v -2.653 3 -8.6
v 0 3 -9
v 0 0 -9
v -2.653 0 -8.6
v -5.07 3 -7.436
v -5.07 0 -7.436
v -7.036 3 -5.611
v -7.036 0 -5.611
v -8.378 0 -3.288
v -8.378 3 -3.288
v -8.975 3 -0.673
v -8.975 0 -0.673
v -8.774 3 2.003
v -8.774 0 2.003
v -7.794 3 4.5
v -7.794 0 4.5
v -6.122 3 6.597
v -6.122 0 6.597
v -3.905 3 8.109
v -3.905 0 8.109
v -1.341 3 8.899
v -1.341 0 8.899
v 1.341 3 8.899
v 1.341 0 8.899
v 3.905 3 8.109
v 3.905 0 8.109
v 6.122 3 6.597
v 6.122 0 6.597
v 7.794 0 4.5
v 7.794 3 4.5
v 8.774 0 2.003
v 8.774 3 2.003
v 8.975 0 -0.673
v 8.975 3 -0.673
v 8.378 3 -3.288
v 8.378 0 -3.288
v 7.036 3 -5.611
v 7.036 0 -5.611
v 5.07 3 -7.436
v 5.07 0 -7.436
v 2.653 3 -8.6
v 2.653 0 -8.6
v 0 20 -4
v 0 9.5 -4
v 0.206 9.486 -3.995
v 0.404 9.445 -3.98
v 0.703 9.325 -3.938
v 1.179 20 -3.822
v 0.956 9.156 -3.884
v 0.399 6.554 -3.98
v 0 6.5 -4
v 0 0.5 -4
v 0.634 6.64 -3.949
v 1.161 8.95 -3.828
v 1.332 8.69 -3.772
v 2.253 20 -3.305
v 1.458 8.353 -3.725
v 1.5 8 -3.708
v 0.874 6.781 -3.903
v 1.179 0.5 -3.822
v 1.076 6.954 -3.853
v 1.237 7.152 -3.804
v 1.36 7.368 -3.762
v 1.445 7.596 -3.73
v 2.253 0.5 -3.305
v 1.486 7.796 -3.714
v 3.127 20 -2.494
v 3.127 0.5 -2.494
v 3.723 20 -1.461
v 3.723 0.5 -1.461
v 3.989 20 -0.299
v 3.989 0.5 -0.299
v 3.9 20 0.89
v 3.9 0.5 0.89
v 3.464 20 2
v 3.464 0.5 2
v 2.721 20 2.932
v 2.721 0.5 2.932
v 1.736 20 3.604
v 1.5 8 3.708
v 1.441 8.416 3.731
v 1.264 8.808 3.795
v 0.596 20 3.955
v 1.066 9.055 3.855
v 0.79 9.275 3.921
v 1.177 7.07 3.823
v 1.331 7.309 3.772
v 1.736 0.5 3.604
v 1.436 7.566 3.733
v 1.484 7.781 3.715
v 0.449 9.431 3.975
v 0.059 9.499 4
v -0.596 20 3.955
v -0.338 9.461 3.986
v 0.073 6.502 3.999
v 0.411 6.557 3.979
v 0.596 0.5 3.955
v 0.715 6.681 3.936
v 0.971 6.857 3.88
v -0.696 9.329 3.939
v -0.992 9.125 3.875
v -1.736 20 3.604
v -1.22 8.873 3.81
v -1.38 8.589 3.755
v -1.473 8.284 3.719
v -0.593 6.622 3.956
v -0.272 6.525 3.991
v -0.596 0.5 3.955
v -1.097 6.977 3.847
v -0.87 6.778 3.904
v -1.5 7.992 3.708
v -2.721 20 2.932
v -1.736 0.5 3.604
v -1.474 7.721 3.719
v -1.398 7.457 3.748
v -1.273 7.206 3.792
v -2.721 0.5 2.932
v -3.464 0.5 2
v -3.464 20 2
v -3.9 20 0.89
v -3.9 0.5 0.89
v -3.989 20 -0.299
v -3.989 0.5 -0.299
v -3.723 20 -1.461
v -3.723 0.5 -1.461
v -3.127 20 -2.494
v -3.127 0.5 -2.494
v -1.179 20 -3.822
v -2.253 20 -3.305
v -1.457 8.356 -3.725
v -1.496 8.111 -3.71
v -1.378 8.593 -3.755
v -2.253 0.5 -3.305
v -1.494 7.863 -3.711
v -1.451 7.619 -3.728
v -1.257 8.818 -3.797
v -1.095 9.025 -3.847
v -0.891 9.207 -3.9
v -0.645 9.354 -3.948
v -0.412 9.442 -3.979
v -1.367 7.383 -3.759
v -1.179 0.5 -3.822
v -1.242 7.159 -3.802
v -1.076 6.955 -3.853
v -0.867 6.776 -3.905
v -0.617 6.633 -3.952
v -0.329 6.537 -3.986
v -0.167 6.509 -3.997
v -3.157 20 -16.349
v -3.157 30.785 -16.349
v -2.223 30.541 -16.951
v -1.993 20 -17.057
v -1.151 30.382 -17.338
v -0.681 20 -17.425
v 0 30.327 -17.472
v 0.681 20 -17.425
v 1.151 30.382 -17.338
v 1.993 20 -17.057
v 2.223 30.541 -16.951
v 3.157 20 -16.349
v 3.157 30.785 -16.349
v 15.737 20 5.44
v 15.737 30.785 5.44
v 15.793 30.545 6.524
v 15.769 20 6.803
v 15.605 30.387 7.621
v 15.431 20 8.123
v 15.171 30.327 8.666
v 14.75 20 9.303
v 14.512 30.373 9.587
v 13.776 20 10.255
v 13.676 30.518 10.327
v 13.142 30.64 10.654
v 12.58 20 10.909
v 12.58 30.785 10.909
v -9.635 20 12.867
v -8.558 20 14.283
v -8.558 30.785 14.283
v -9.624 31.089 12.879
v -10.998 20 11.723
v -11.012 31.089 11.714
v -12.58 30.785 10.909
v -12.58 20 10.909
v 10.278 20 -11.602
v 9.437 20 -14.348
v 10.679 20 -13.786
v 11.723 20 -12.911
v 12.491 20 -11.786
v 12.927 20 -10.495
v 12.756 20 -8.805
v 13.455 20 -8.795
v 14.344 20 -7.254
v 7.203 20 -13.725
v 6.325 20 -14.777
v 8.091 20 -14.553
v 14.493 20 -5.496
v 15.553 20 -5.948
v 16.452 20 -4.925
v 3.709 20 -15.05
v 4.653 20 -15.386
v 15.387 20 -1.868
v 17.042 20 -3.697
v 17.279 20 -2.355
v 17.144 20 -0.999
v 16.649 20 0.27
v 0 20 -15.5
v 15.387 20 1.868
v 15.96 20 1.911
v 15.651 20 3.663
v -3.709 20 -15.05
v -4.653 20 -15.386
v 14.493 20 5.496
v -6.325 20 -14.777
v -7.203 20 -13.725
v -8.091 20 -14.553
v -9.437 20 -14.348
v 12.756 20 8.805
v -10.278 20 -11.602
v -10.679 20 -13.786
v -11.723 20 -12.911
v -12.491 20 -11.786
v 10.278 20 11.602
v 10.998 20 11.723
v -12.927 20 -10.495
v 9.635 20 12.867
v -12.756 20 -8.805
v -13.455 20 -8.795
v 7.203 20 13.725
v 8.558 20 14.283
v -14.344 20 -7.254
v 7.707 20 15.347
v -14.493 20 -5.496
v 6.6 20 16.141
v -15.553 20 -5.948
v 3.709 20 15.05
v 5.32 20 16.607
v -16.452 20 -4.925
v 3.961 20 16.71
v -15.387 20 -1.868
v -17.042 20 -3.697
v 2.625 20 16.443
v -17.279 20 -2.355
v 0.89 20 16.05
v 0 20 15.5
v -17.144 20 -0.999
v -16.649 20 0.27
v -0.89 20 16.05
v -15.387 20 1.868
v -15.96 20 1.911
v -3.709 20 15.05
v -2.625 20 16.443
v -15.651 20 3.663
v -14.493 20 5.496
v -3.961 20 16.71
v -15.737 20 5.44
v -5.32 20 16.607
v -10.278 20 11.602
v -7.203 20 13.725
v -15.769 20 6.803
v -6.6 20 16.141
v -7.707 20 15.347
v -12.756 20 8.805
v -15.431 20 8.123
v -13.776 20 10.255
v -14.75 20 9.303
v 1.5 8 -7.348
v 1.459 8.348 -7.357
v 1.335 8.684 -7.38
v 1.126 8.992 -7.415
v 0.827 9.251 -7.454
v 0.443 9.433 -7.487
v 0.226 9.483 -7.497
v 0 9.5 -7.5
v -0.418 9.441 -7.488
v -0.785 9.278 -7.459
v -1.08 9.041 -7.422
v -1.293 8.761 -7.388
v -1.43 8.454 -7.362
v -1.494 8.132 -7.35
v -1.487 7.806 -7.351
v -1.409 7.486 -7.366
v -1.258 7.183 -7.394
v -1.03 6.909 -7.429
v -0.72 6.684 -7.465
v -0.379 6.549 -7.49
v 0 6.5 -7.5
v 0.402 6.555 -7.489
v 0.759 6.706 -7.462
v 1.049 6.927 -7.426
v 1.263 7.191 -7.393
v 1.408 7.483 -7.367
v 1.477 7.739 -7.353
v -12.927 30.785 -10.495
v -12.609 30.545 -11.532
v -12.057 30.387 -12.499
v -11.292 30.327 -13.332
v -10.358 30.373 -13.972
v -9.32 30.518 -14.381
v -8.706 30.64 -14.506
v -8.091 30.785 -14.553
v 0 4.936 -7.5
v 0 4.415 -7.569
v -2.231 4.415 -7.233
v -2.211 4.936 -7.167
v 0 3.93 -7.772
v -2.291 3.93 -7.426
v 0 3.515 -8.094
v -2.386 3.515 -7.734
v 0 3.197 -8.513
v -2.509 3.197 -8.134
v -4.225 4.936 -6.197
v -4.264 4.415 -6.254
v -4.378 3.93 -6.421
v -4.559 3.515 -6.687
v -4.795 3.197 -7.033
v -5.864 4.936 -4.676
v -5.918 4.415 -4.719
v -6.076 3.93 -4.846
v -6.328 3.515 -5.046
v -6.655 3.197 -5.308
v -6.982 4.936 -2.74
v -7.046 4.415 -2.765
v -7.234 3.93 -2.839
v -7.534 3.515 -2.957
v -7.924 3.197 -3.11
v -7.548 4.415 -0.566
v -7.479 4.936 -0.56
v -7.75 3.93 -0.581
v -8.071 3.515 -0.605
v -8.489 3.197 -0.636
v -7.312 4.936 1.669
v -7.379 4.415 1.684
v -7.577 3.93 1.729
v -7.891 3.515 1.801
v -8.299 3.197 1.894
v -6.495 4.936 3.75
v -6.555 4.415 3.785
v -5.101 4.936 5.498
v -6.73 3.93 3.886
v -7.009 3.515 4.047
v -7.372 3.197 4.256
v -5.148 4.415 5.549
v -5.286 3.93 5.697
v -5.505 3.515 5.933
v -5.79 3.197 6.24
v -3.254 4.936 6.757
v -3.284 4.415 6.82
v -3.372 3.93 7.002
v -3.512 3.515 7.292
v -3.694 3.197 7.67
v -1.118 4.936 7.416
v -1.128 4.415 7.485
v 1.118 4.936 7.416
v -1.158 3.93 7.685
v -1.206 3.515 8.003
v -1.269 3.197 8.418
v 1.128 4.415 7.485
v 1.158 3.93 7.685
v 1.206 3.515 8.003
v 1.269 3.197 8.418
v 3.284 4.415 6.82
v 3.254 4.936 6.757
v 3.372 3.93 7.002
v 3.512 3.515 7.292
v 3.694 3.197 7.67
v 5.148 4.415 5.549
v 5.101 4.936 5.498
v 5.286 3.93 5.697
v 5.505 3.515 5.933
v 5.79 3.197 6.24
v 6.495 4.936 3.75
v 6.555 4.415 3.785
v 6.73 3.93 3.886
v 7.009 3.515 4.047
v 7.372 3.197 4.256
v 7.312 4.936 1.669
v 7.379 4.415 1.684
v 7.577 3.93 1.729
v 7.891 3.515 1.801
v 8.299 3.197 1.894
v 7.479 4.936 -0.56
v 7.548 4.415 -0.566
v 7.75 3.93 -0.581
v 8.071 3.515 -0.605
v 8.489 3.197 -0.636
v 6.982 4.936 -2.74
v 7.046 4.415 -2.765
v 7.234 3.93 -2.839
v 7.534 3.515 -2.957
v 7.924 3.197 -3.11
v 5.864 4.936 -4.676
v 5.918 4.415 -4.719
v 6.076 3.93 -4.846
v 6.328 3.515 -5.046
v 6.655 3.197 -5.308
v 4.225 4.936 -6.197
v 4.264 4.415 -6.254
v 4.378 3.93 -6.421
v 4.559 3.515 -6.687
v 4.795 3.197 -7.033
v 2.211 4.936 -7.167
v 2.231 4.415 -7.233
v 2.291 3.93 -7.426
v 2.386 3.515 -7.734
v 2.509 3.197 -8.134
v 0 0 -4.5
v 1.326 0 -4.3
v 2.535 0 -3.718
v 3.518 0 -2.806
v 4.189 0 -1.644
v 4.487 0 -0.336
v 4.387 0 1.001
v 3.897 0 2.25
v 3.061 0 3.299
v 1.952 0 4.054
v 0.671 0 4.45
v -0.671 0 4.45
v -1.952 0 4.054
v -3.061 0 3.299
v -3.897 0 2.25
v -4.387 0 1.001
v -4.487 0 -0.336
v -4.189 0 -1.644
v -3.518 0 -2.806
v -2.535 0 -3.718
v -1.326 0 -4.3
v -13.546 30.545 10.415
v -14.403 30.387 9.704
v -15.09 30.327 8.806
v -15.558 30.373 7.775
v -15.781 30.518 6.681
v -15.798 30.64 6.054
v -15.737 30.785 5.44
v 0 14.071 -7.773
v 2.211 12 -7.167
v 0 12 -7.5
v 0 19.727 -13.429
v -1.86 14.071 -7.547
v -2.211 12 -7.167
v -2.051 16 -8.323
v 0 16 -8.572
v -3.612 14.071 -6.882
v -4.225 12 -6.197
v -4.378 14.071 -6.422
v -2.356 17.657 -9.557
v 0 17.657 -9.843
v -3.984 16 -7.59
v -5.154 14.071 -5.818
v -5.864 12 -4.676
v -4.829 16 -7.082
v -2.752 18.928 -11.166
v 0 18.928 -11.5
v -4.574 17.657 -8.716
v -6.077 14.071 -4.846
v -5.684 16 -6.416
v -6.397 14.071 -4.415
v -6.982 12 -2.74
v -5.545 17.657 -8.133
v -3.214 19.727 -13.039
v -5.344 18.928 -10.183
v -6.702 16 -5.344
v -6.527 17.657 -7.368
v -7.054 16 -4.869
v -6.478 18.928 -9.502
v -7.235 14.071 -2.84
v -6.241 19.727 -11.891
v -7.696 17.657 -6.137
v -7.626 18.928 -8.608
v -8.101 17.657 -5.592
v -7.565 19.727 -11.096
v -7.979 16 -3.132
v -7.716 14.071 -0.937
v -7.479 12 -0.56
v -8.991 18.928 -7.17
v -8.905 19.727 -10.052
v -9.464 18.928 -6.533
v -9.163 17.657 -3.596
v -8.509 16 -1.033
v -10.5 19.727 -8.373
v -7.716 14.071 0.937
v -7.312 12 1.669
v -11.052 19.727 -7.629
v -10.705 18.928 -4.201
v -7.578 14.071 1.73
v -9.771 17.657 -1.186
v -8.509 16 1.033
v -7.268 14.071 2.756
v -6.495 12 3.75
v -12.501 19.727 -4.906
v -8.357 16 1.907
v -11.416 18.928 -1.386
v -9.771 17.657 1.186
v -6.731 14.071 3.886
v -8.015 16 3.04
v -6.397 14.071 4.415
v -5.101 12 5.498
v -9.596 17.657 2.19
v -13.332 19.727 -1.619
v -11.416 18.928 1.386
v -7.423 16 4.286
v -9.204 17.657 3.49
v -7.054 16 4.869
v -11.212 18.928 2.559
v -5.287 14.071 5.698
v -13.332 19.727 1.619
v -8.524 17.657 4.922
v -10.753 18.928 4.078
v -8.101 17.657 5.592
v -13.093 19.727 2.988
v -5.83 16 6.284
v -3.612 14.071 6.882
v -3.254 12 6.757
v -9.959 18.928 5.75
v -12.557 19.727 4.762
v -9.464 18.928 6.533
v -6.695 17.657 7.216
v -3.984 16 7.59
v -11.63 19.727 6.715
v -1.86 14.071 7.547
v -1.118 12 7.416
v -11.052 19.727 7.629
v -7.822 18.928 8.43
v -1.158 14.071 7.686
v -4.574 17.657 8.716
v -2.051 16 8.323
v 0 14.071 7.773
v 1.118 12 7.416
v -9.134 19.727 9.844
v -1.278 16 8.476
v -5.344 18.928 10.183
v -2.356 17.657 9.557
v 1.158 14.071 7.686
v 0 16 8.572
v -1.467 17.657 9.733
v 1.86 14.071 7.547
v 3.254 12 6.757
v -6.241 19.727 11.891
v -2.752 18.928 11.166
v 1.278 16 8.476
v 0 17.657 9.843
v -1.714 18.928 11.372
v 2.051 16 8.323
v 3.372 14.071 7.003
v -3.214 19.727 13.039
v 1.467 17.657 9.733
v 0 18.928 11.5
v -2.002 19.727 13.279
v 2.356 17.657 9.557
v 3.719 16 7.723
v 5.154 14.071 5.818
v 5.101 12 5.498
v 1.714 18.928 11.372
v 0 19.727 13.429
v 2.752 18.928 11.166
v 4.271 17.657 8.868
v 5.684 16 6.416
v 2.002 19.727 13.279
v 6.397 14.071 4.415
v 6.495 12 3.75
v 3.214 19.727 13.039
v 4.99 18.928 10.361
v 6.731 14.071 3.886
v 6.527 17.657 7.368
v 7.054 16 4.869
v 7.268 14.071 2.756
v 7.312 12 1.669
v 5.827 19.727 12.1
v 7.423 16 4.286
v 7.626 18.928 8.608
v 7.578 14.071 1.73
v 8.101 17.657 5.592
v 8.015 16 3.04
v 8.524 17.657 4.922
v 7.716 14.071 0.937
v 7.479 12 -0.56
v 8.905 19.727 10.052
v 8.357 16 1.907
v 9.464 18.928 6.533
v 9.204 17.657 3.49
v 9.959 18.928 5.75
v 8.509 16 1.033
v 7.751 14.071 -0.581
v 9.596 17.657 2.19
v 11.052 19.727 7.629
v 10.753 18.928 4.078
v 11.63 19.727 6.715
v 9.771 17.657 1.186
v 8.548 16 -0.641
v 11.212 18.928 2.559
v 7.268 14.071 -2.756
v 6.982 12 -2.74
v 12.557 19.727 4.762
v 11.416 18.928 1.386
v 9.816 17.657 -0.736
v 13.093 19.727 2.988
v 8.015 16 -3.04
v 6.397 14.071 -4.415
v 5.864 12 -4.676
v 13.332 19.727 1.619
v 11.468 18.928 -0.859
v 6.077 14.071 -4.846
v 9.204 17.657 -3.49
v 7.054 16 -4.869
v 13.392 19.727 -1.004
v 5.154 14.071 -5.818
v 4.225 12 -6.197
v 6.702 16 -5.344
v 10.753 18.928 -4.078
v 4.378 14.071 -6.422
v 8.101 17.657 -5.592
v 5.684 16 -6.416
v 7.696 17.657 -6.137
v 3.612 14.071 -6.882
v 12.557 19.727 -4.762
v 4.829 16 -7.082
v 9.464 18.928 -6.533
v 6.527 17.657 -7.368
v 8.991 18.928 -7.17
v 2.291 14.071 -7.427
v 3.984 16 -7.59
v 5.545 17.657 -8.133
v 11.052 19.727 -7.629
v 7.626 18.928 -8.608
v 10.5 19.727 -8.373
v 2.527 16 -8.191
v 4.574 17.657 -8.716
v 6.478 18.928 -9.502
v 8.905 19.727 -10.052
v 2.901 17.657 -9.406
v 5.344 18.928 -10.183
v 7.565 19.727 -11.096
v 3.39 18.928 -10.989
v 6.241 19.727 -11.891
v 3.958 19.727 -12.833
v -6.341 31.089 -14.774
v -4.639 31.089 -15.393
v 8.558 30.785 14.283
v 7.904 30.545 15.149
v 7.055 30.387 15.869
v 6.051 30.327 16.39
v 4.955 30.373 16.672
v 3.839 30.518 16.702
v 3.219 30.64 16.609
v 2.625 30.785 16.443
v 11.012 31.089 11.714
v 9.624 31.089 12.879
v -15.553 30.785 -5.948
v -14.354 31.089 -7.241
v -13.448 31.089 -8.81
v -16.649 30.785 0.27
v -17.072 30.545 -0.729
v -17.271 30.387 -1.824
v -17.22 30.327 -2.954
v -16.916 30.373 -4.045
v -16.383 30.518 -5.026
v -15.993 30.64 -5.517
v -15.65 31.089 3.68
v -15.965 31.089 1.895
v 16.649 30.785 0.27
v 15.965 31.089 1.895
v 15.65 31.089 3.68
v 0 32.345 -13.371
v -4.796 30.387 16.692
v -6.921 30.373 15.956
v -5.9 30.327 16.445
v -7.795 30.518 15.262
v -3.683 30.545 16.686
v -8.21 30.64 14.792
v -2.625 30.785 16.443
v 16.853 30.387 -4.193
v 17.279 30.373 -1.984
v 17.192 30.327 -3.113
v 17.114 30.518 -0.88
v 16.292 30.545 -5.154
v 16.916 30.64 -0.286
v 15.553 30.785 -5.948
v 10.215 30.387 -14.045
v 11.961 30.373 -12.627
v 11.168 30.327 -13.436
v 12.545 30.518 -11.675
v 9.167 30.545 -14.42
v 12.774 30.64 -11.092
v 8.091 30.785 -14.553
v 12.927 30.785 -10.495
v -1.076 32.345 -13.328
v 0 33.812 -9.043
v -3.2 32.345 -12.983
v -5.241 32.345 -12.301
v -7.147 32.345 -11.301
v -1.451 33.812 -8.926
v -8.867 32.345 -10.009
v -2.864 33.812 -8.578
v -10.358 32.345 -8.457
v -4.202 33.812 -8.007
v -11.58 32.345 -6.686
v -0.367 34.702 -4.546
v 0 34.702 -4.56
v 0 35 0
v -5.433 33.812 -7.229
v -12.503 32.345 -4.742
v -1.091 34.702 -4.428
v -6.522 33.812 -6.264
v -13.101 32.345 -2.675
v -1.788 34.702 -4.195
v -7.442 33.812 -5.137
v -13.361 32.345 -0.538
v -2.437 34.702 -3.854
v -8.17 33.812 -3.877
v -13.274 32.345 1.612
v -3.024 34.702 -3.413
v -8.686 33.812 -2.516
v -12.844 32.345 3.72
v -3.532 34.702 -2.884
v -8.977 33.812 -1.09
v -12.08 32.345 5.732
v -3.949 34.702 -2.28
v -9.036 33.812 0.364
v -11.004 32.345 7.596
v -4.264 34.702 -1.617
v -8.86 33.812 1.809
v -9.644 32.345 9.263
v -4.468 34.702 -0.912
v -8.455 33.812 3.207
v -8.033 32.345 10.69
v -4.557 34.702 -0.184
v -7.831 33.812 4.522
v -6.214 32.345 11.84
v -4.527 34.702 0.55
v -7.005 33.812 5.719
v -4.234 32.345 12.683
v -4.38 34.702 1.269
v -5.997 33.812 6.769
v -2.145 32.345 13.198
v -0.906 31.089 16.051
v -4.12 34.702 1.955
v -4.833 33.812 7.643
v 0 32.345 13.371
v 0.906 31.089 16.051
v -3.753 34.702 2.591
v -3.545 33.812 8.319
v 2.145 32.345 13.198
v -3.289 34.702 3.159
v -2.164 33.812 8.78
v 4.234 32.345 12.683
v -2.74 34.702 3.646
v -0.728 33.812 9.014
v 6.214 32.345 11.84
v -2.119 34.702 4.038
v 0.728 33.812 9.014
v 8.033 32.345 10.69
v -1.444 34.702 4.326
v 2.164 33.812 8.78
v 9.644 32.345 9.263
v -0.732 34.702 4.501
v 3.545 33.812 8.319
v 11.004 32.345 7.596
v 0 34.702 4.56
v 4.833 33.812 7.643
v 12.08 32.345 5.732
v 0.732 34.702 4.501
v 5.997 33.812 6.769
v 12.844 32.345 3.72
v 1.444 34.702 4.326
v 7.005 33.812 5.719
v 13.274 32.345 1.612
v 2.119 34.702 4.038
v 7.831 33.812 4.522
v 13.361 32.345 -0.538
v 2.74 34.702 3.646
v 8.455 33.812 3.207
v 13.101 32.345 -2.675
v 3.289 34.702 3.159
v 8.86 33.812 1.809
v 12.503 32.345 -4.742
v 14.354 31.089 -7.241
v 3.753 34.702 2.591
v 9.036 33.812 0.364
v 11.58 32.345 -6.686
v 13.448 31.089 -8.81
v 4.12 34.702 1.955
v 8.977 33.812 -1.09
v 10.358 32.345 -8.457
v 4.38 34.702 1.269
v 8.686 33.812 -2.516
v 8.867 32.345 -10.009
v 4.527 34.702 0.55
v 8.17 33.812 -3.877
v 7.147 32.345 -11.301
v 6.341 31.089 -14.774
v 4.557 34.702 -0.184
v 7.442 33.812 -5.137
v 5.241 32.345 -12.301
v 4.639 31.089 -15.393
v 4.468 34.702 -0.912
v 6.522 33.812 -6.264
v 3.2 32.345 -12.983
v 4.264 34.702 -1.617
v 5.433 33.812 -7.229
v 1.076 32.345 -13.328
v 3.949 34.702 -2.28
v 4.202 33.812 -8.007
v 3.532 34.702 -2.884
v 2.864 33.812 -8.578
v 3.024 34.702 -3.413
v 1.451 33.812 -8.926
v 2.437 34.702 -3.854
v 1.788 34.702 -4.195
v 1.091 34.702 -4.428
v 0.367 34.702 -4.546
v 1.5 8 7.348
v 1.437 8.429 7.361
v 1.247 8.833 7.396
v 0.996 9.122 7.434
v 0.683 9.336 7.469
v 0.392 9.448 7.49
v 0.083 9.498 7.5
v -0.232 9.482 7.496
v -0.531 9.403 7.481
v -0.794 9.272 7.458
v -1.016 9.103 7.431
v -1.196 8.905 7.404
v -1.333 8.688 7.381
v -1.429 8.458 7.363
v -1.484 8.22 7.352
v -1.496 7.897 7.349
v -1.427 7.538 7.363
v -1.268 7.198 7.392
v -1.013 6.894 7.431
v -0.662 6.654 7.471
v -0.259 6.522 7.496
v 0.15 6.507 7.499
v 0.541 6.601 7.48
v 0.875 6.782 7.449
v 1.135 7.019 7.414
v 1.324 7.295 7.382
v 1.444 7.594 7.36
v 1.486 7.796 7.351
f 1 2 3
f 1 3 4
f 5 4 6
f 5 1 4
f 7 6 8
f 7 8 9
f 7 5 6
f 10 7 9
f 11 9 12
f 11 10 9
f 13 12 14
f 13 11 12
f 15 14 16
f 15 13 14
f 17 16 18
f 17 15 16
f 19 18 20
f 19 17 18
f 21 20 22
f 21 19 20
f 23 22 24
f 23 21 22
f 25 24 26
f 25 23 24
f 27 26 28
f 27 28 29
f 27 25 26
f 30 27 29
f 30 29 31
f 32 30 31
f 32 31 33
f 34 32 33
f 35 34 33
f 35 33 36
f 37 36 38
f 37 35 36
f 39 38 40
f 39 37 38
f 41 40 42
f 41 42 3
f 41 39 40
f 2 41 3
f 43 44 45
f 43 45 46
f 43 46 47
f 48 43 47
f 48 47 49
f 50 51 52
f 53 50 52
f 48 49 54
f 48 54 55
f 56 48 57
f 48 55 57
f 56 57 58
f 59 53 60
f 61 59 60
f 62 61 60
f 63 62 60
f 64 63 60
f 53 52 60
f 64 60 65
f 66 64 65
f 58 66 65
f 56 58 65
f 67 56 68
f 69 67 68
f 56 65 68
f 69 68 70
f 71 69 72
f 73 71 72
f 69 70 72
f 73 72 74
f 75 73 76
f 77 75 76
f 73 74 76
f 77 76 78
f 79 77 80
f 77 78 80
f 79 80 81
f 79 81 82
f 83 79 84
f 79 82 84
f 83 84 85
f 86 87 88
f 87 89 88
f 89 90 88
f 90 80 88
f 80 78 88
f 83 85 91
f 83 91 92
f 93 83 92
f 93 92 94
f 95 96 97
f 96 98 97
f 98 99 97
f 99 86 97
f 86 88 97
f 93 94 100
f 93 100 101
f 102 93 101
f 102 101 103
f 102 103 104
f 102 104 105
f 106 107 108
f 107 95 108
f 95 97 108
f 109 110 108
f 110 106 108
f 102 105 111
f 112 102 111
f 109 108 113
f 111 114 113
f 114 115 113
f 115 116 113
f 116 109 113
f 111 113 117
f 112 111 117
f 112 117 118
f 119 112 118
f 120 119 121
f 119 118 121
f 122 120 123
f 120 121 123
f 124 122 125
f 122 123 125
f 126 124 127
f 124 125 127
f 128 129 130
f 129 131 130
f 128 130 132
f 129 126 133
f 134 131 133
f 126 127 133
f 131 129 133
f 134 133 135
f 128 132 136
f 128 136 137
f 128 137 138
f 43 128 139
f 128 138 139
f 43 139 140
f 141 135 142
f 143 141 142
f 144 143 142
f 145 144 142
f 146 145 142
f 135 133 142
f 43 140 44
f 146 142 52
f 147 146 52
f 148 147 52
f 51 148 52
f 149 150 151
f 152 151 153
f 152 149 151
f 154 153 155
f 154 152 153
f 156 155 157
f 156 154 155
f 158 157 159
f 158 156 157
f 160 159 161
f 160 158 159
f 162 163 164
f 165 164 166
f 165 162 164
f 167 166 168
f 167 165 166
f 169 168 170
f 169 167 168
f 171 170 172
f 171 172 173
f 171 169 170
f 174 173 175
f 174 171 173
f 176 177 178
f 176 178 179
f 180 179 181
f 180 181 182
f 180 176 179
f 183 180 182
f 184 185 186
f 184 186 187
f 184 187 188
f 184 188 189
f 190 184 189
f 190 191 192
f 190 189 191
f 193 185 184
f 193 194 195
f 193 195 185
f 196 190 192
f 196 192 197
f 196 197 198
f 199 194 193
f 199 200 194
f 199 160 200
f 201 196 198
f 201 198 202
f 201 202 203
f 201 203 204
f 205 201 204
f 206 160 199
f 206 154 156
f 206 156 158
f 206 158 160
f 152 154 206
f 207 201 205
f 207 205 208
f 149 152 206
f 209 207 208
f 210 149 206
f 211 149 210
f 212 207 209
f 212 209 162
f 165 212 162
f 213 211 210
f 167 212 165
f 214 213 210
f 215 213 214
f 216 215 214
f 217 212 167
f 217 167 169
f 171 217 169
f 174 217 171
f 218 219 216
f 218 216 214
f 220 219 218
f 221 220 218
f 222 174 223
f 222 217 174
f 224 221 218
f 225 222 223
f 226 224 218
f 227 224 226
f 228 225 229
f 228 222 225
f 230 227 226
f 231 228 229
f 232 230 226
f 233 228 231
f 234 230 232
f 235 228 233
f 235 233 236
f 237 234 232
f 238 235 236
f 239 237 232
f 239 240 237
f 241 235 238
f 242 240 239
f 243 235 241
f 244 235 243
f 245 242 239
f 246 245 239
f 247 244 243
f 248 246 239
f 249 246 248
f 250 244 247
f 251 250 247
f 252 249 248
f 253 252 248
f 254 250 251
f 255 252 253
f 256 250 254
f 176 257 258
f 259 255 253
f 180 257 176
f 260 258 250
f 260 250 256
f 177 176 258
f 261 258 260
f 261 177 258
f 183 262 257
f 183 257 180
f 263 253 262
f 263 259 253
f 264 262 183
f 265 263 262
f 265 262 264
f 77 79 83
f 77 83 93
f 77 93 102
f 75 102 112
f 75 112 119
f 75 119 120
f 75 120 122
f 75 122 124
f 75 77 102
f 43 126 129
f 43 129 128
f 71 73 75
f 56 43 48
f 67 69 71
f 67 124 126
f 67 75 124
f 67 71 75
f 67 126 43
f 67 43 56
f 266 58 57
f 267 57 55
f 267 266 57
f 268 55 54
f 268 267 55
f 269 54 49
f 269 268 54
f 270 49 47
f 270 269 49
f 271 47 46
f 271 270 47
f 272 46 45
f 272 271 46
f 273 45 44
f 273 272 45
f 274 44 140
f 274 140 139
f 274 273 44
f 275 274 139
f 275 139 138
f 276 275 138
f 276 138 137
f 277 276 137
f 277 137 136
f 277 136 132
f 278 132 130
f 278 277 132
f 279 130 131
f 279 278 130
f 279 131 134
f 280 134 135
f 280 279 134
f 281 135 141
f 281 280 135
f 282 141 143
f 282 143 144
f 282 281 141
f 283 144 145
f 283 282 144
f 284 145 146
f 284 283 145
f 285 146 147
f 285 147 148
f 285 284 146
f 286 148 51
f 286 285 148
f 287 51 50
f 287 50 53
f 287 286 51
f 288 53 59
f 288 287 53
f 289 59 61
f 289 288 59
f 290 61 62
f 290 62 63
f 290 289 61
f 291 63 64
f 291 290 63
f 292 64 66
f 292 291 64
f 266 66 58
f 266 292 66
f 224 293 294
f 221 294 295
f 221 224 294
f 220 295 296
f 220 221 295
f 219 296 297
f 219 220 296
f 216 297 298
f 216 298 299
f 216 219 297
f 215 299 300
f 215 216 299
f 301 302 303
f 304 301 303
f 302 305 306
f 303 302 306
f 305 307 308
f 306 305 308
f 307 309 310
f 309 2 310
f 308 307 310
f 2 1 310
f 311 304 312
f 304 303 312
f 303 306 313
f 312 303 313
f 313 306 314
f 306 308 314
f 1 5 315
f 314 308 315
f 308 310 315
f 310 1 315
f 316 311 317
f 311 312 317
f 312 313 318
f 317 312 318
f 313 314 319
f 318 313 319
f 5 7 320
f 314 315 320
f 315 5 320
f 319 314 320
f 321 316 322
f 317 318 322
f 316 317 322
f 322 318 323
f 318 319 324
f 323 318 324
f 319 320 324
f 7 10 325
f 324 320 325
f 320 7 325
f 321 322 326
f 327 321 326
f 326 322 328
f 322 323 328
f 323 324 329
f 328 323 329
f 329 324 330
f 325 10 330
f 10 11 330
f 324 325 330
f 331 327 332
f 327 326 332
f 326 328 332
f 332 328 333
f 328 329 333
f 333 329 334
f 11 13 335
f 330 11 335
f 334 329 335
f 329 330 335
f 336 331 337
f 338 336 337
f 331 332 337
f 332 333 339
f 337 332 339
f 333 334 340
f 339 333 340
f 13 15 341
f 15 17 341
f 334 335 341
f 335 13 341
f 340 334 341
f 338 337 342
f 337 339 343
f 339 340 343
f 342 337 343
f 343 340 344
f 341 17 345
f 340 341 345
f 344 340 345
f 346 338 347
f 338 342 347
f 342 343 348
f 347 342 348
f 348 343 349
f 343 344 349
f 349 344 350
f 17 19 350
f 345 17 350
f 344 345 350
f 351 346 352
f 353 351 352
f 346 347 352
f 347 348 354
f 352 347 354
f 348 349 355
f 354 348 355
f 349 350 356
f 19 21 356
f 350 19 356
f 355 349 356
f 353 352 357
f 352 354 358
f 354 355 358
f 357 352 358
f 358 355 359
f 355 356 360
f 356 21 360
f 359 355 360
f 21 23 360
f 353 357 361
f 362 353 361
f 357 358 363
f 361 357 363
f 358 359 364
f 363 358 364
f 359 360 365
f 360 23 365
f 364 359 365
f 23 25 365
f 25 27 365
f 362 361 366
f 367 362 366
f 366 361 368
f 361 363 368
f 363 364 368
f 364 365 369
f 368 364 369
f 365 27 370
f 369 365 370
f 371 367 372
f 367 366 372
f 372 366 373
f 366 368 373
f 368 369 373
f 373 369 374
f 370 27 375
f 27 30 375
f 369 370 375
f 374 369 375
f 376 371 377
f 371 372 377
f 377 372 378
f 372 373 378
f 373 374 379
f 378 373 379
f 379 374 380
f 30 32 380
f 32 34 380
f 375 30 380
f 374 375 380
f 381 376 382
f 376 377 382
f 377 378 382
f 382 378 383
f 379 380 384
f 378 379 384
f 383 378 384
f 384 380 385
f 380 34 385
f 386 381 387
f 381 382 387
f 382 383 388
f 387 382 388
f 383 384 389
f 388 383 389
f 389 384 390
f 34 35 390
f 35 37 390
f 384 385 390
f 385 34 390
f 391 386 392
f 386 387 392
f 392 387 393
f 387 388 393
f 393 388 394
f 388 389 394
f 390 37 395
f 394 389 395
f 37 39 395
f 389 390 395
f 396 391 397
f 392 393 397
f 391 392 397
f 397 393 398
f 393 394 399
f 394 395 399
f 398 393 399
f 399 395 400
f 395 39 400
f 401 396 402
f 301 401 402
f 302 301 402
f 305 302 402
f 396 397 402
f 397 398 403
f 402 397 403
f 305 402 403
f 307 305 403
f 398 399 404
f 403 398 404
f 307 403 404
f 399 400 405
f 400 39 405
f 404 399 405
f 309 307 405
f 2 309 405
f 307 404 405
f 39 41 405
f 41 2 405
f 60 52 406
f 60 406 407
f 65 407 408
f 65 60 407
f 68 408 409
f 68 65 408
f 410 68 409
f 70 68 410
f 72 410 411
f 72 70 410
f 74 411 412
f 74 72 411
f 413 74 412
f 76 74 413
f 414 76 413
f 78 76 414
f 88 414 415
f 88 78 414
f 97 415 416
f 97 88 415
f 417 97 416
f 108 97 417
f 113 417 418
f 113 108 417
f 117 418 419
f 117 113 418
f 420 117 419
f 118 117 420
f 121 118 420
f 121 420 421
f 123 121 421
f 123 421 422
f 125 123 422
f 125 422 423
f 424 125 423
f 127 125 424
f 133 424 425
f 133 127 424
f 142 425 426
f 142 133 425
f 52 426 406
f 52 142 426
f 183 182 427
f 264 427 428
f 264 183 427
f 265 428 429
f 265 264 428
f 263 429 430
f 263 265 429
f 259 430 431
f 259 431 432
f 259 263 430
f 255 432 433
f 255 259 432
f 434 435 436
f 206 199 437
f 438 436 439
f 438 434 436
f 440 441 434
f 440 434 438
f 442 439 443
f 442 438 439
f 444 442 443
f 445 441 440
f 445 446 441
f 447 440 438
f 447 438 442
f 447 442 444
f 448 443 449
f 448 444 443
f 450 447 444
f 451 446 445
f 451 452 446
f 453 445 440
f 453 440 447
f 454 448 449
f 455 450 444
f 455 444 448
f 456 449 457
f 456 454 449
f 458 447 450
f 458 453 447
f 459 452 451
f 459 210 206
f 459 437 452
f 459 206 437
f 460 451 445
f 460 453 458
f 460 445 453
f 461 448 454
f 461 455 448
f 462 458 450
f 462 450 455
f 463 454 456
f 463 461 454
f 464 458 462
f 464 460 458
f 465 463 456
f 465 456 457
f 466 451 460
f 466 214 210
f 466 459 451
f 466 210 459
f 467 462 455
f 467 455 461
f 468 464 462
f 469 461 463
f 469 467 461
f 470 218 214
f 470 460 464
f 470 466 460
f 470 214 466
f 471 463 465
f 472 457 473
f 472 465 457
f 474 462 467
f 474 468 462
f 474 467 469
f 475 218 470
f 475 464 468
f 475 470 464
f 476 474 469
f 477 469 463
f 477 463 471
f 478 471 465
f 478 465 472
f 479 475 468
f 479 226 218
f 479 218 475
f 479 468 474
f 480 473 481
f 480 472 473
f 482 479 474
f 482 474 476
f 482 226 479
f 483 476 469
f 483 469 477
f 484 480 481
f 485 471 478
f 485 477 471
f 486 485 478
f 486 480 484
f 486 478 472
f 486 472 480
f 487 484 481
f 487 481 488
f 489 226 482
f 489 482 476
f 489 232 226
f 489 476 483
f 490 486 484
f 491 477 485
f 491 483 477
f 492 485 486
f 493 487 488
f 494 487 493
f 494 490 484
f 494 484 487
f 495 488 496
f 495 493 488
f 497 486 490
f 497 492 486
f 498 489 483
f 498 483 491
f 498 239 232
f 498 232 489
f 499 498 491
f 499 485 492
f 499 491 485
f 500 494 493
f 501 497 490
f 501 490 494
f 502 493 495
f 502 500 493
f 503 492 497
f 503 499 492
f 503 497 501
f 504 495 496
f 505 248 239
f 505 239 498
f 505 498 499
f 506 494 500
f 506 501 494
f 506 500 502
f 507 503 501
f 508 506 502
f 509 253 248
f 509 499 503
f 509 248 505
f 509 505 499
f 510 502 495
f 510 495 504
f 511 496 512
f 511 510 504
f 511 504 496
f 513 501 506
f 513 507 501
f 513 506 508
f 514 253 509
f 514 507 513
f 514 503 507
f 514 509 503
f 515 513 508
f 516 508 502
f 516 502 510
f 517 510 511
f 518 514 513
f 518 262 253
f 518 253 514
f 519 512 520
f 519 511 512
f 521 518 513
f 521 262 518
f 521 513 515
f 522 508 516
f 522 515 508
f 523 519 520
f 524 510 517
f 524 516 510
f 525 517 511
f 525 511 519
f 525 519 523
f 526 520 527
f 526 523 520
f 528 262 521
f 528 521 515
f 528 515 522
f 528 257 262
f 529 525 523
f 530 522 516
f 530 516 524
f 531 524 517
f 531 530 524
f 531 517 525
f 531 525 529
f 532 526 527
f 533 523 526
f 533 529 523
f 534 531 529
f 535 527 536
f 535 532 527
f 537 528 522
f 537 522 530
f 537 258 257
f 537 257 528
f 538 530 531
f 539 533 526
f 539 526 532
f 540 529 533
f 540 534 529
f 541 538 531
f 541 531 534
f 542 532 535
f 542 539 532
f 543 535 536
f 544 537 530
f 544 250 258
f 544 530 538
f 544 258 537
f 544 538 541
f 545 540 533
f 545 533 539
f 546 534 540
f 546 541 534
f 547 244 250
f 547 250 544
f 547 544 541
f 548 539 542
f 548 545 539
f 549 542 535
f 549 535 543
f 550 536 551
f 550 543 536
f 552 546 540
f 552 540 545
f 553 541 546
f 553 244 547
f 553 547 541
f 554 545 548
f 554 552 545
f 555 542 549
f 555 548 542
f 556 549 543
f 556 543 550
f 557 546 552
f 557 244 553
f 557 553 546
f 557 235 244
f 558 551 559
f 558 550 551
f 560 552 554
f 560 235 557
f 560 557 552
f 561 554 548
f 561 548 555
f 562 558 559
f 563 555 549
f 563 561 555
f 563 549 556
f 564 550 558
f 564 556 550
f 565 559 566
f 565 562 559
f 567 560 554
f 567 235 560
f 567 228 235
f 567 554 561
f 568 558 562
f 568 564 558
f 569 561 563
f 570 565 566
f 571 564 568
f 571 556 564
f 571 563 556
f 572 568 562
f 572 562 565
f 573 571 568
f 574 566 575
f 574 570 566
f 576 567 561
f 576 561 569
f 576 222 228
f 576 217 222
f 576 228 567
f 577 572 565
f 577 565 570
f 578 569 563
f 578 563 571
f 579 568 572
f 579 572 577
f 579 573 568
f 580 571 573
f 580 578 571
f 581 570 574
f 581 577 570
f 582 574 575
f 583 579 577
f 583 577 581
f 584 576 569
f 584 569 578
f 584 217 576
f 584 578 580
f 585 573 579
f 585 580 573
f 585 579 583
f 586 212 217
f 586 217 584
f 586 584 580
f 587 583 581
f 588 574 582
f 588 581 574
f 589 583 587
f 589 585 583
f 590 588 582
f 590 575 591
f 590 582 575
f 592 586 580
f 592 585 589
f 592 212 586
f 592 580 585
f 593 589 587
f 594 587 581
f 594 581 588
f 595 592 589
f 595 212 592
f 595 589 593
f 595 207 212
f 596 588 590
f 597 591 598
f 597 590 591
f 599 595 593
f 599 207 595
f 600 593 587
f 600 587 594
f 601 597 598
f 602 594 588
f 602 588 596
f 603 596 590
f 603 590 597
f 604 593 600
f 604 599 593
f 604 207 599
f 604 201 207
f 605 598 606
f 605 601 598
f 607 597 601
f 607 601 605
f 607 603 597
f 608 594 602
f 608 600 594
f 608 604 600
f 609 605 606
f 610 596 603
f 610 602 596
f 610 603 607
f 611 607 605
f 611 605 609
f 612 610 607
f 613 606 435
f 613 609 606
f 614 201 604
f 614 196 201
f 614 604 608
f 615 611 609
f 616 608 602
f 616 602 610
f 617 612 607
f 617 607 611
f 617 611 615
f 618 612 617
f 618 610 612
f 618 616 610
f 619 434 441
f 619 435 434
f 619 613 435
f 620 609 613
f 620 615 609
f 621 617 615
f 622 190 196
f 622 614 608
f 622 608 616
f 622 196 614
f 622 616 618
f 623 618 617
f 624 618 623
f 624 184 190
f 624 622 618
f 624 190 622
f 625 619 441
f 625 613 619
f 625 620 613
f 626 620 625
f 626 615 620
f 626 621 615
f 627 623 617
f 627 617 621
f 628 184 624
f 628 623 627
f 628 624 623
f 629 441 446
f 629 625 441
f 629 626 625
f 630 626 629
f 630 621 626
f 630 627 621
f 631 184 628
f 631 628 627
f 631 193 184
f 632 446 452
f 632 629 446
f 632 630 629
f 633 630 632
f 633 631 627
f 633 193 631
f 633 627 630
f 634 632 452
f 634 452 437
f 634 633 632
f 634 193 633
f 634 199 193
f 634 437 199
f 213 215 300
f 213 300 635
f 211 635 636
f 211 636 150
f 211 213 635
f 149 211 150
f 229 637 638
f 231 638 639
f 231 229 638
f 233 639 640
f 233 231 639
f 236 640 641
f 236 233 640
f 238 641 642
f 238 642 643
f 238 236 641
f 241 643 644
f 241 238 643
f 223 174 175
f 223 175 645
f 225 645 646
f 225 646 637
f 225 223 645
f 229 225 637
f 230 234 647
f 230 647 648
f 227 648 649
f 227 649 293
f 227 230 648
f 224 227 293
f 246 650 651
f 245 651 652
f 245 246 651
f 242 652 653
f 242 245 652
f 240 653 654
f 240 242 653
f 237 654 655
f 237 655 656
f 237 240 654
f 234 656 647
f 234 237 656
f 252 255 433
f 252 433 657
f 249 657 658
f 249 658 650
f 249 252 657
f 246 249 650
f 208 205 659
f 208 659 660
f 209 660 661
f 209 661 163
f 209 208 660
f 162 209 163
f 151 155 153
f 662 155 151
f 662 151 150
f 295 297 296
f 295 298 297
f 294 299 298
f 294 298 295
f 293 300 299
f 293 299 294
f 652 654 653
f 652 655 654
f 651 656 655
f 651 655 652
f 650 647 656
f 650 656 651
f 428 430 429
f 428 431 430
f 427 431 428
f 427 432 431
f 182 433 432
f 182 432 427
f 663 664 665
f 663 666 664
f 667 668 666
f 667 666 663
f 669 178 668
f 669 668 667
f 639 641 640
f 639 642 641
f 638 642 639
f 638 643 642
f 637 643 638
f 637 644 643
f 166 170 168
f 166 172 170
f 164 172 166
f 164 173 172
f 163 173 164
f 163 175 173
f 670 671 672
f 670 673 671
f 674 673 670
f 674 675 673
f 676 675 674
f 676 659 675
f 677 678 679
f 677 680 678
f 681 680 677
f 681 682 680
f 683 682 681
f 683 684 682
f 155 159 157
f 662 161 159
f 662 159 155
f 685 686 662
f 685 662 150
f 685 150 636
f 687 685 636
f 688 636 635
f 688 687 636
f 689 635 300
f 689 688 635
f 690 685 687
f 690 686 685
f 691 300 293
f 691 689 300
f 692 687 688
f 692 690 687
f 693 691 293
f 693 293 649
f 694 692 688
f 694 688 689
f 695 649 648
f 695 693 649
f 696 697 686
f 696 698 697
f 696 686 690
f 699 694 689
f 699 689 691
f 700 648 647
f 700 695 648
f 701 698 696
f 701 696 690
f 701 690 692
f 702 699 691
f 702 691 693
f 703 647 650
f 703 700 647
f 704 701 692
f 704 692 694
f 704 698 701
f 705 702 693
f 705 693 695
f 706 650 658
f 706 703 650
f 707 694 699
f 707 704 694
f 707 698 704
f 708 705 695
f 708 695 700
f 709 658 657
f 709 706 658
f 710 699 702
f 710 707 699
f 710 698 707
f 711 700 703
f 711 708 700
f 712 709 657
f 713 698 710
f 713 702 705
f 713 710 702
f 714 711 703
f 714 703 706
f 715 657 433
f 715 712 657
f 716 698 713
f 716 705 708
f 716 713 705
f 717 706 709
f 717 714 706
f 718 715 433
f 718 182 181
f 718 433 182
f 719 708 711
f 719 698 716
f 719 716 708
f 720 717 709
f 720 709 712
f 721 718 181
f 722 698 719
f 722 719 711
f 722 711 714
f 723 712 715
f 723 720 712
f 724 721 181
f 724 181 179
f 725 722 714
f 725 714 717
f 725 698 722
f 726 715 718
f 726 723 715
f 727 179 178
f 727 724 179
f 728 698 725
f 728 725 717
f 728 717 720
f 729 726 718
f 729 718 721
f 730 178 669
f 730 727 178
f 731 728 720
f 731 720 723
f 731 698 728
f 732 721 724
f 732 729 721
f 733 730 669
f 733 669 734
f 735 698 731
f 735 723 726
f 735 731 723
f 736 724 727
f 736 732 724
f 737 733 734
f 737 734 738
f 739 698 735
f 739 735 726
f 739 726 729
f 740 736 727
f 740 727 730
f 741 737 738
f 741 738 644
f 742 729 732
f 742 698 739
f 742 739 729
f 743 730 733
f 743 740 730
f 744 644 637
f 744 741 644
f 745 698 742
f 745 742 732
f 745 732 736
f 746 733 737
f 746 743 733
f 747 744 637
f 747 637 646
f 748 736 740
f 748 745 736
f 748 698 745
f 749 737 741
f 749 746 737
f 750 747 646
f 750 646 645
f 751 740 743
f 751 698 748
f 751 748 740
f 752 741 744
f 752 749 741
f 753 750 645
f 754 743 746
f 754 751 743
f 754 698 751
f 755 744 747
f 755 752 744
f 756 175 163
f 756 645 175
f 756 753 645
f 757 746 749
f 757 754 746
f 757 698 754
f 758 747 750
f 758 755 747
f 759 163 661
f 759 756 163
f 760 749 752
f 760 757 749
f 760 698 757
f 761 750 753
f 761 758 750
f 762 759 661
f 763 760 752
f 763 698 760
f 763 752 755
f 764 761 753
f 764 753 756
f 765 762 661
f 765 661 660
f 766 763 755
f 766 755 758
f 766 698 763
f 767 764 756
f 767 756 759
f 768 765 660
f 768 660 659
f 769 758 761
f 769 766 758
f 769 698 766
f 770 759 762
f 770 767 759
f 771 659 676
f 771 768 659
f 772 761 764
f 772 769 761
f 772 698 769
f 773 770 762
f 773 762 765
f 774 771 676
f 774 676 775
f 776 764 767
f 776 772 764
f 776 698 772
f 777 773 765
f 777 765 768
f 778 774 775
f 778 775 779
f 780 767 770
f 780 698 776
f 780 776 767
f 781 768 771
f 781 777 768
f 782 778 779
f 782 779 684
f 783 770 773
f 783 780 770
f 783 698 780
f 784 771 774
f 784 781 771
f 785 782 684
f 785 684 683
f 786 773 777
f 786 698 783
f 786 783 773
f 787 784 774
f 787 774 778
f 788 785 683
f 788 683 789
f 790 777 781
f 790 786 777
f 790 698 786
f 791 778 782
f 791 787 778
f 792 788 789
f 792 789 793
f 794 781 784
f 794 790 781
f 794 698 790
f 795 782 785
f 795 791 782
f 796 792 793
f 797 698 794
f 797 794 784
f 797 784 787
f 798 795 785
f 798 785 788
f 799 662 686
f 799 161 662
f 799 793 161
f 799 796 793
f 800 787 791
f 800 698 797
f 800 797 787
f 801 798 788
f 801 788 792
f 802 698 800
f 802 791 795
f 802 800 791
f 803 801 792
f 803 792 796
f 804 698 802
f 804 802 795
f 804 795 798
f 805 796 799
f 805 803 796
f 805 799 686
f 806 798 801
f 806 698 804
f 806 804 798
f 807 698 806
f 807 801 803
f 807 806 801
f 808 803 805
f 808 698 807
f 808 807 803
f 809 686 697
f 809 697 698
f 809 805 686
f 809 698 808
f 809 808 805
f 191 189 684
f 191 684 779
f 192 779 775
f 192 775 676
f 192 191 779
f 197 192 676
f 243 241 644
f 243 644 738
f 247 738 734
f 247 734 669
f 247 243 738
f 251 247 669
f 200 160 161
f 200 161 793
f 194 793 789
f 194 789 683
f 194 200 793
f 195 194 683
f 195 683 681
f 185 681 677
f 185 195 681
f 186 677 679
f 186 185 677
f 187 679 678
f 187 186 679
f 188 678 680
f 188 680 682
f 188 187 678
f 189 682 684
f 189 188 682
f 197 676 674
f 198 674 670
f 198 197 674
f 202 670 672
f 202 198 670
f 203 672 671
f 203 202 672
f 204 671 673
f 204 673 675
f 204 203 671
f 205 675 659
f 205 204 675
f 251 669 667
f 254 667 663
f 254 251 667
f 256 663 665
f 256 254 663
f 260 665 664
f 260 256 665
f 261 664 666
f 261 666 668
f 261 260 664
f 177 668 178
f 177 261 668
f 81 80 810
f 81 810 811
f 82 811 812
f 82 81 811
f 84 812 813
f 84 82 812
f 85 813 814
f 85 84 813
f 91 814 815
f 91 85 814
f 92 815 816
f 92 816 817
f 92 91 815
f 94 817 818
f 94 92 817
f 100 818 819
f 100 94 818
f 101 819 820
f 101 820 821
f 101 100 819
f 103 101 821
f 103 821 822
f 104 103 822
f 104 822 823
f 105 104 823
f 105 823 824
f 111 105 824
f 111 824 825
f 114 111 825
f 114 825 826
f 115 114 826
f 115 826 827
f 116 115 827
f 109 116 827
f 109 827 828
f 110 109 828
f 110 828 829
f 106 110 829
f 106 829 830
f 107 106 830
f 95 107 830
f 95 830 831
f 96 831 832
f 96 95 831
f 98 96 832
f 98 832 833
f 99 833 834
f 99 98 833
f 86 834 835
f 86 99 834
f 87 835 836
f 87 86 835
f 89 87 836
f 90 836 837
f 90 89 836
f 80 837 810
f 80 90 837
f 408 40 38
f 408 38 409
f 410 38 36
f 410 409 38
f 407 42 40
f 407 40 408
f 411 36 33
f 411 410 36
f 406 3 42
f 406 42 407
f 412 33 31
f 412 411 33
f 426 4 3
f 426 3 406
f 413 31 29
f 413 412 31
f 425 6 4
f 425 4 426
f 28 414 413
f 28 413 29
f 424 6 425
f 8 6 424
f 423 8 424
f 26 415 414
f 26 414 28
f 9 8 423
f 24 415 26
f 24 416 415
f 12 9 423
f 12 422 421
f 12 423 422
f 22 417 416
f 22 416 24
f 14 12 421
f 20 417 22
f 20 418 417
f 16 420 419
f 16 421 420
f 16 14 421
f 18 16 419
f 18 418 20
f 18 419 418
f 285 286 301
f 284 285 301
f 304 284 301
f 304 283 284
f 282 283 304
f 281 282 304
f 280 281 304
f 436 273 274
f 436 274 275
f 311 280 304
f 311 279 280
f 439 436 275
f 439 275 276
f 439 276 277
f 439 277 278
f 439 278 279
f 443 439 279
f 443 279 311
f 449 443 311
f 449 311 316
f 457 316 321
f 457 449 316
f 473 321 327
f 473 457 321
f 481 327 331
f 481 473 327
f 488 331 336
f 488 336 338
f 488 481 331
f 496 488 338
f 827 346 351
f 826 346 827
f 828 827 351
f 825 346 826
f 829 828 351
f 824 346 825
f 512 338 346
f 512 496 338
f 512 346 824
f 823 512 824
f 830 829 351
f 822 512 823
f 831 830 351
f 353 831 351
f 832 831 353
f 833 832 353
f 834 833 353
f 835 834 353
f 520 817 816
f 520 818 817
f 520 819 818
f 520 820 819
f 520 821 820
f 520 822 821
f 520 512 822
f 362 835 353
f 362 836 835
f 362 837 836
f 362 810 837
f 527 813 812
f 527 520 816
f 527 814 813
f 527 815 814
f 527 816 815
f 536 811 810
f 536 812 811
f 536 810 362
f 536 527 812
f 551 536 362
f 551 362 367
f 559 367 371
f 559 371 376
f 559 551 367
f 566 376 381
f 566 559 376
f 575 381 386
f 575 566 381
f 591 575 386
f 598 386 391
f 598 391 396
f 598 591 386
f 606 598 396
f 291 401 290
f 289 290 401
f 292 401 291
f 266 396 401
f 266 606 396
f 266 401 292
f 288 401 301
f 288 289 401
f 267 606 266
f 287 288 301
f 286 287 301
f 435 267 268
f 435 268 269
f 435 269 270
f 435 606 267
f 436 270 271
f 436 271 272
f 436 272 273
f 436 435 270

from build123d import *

# Parameters (mm, degrees)
FILLET_1_R               = 2
SKETCH_2_R               = 4
CUT_EXTRUDE_1_DEPTH      = 20
CUT_EXTRUDE_2_DEPTH      = 43.866070499
CUT_EXTRUDE_2_DEPTH_BACK = 43.866070499
SKETCH_3_R               = 1.5
CHAMFER_1_SIZE           = 0.5
CUT_EXTRUDE_3_DEPTH      = 43.866070499
CUT_EXTRUDE_3_DEPTH_BACK = 43.866070499
SKETCH_4_OUTSIDE_W       = 49.124
SKETCH_4_OUTSIDE_H       = 49.124


with BuildPart() as part:
    # 草图1 → 旋转1 (revolve)
    with BuildSketch(Plane.XY, mode=Mode.PRIVATE) as revolve_1_sk:
        with BuildLine():
            Line((0, 0), (9, 0))
            Line((9, 0), (9, 3))
            Line((9, 3), (7.5, 3))
            Line((7.5, 3), (7.5, 12))
            ThreePointArc((7.5, 12), (9.843145751, 17.656854249), (15.5, 20))
            Line((15.5, 20), (17.5, 20))
            Line((17.5, 20), (17.5, 30.310889132))
            ThreePointArc((17.5, 30.310889132), (9.058666579, 33.80740392), (0, 35))
            Line((0, 35), (0, 0))
        make_face()
    revolve(revolve_1_sk.sketch.rotate(Axis((0, 0, 0), (0, 1, 0)), 90), axis=Axis((0, 0, 0), (0, 1, 0)))

    # 圆角1
    # the kernel refuses this fillet: 2 mm, written as the material it adds along each edge
    with BuildSketch(Plane(origin=(0, 3, 0), x_dir=(0, 0, -1), z_dir=(1, 0, 0))) as fillet_1_piece_1:
        with BuildLine():
            CenterArc((9.5, 1.936491673), FILLET_1_R, 180, 75.522487814)
            Line((7.5, 1.936491673), (7.46, 1.936491673))
            Line((7.46, 1.936491673), (7.46, 0))
            Line((7.46, 0), (7.5, -0.04))
            ThreePointArc((7.5, -0.04), (8.25, -0.04), (8.99, -0.038729833))
            Line((8.99, -0.038729833), (9, 0))
        make_face()
    revolve(axis=Axis((0, 3, 0), (0, 1, 0)))

    # 草图2 → 切除-拉伸1 (cut)
    with BuildSketch(Plane.XZ):
        with Locations(Location((0, 0, 0), (0, 0, 270))):
            Circle(SKETCH_2_R)
    extrude(amount=-CUT_EXTRUDE_1_DEPTH, mode=Mode.SUBTRACT)

    # 草图3 → 切除-拉伸2 (cut, two sides: drawn at the far end of the back side and taken through both)
    with BuildSketch(Plane.XY.offset(-CUT_EXTRUDE_2_DEPTH_BACK)):
        with Locations((0, 8)):
            Circle(SKETCH_3_R)
    extrude(amount=CUT_EXTRUDE_2_DEPTH + CUT_EXTRUDE_2_DEPTH_BACK, mode=Mode.SUBTRACT)

    # 倒角1
    chamfer_1_edges = [part.edges().sort_by_distance(p)[0] for p in [
        (0, 0, 4),
    ]]
    chamfer(chamfer_1_edges, length=CHAMFER_1_SIZE)

    # 草图4 outside → 切除-拉伸3 (cut, two sides: drawn at the far end of the back side and taken through both)
    with BuildSketch(Plane(origin=(0, 0, 0), x_dir=(1, 0, 0), z_dir=(0, 1, 0)).offset(-CUT_EXTRUDE_3_DEPTH_BACK)):
        Rectangle(SKETCH_4_OUTSIDE_W, SKETCH_4_OUTSIDE_H)
        with BuildLine():
            ThreePointArc((2.625011684, -16.442929558), (0, -16), (-2.625011684, -16.442929558))
            ThreePointArc((-2.625011684, -16.442929558), (-5.975744703, -16.418223636), (-8.558435773, -14.283339803))
            ThreePointArc((-8.558435773, -14.283339803), (-10.284601755, -12.25671109), (-12.580187001, -10.908689831))
            ThreePointArc((-12.580187001, -10.908689831), (-15.13111675, -8.735954329), (-15.737296016, -5.440416612))
            ThreePointArc((-15.737296016, -5.440416612), (-15.756924048, -2.778370843), (-16.648953007, -0.270152895))
            ThreePointArc((-16.648953007, -0.270152895), (-17.206471106, 3.033965099), (-15.552500552, 5.948137976))
            ThreePointArc((-15.552500552, 5.948137976), (-13.856406461, 8), (-12.927488868, 10.494791583))
            ThreePointArc((-12.927488868, 10.494791583), (-11.230726403, 13.384258538), (-8.090517233, 14.553492698))
            ThreePointArc((-8.090517233, 14.553492698), (-5.472322293, 15.035081933), (-3.157109015, 16.349106443))
            ThreePointArc((-3.157109015, 16.349106443), (0, 17.471908657), (3.157109015, 16.349106443))
            ThreePointArc((3.157109015, 16.349106443), (5.472322293, 15.035081933), (8.090517233, 14.553492698))
            ThreePointArc((8.090517233, 14.553492698), (11.230726403, 13.384258538), (12.927488868, 10.494791583))
            ThreePointArc((12.927488868, 10.494791583), (13.856406461, 8), (15.552500552, 5.948137976))
            ThreePointArc((15.552500552, 5.948137976), (17.206471106, 3.033965099), (16.648953007, -0.270152895))
            ThreePointArc((16.648953007, -0.270152895), (15.756924048, -2.778370843), (15.737296016, -5.440416612))
            ThreePointArc((15.737296016, -5.440416612), (15.13111675, -8.735954329), (12.580187001, -10.908689831))
            ThreePointArc((12.580187001, -10.908689831), (10.284601755, -12.25671109), (8.558435773, -14.283339803))
            ThreePointArc((8.558435773, -14.283339803), (5.975744703, -16.418223636), (2.625011684, -16.442929558))
        make_face(mode=Mode.SUBTRACT)
    extrude(amount=CUT_EXTRUDE_3_DEPTH + CUT_EXTRUDE_3_DEPTH_BACK, mode=Mode.SUBTRACT)


solid = part.part
